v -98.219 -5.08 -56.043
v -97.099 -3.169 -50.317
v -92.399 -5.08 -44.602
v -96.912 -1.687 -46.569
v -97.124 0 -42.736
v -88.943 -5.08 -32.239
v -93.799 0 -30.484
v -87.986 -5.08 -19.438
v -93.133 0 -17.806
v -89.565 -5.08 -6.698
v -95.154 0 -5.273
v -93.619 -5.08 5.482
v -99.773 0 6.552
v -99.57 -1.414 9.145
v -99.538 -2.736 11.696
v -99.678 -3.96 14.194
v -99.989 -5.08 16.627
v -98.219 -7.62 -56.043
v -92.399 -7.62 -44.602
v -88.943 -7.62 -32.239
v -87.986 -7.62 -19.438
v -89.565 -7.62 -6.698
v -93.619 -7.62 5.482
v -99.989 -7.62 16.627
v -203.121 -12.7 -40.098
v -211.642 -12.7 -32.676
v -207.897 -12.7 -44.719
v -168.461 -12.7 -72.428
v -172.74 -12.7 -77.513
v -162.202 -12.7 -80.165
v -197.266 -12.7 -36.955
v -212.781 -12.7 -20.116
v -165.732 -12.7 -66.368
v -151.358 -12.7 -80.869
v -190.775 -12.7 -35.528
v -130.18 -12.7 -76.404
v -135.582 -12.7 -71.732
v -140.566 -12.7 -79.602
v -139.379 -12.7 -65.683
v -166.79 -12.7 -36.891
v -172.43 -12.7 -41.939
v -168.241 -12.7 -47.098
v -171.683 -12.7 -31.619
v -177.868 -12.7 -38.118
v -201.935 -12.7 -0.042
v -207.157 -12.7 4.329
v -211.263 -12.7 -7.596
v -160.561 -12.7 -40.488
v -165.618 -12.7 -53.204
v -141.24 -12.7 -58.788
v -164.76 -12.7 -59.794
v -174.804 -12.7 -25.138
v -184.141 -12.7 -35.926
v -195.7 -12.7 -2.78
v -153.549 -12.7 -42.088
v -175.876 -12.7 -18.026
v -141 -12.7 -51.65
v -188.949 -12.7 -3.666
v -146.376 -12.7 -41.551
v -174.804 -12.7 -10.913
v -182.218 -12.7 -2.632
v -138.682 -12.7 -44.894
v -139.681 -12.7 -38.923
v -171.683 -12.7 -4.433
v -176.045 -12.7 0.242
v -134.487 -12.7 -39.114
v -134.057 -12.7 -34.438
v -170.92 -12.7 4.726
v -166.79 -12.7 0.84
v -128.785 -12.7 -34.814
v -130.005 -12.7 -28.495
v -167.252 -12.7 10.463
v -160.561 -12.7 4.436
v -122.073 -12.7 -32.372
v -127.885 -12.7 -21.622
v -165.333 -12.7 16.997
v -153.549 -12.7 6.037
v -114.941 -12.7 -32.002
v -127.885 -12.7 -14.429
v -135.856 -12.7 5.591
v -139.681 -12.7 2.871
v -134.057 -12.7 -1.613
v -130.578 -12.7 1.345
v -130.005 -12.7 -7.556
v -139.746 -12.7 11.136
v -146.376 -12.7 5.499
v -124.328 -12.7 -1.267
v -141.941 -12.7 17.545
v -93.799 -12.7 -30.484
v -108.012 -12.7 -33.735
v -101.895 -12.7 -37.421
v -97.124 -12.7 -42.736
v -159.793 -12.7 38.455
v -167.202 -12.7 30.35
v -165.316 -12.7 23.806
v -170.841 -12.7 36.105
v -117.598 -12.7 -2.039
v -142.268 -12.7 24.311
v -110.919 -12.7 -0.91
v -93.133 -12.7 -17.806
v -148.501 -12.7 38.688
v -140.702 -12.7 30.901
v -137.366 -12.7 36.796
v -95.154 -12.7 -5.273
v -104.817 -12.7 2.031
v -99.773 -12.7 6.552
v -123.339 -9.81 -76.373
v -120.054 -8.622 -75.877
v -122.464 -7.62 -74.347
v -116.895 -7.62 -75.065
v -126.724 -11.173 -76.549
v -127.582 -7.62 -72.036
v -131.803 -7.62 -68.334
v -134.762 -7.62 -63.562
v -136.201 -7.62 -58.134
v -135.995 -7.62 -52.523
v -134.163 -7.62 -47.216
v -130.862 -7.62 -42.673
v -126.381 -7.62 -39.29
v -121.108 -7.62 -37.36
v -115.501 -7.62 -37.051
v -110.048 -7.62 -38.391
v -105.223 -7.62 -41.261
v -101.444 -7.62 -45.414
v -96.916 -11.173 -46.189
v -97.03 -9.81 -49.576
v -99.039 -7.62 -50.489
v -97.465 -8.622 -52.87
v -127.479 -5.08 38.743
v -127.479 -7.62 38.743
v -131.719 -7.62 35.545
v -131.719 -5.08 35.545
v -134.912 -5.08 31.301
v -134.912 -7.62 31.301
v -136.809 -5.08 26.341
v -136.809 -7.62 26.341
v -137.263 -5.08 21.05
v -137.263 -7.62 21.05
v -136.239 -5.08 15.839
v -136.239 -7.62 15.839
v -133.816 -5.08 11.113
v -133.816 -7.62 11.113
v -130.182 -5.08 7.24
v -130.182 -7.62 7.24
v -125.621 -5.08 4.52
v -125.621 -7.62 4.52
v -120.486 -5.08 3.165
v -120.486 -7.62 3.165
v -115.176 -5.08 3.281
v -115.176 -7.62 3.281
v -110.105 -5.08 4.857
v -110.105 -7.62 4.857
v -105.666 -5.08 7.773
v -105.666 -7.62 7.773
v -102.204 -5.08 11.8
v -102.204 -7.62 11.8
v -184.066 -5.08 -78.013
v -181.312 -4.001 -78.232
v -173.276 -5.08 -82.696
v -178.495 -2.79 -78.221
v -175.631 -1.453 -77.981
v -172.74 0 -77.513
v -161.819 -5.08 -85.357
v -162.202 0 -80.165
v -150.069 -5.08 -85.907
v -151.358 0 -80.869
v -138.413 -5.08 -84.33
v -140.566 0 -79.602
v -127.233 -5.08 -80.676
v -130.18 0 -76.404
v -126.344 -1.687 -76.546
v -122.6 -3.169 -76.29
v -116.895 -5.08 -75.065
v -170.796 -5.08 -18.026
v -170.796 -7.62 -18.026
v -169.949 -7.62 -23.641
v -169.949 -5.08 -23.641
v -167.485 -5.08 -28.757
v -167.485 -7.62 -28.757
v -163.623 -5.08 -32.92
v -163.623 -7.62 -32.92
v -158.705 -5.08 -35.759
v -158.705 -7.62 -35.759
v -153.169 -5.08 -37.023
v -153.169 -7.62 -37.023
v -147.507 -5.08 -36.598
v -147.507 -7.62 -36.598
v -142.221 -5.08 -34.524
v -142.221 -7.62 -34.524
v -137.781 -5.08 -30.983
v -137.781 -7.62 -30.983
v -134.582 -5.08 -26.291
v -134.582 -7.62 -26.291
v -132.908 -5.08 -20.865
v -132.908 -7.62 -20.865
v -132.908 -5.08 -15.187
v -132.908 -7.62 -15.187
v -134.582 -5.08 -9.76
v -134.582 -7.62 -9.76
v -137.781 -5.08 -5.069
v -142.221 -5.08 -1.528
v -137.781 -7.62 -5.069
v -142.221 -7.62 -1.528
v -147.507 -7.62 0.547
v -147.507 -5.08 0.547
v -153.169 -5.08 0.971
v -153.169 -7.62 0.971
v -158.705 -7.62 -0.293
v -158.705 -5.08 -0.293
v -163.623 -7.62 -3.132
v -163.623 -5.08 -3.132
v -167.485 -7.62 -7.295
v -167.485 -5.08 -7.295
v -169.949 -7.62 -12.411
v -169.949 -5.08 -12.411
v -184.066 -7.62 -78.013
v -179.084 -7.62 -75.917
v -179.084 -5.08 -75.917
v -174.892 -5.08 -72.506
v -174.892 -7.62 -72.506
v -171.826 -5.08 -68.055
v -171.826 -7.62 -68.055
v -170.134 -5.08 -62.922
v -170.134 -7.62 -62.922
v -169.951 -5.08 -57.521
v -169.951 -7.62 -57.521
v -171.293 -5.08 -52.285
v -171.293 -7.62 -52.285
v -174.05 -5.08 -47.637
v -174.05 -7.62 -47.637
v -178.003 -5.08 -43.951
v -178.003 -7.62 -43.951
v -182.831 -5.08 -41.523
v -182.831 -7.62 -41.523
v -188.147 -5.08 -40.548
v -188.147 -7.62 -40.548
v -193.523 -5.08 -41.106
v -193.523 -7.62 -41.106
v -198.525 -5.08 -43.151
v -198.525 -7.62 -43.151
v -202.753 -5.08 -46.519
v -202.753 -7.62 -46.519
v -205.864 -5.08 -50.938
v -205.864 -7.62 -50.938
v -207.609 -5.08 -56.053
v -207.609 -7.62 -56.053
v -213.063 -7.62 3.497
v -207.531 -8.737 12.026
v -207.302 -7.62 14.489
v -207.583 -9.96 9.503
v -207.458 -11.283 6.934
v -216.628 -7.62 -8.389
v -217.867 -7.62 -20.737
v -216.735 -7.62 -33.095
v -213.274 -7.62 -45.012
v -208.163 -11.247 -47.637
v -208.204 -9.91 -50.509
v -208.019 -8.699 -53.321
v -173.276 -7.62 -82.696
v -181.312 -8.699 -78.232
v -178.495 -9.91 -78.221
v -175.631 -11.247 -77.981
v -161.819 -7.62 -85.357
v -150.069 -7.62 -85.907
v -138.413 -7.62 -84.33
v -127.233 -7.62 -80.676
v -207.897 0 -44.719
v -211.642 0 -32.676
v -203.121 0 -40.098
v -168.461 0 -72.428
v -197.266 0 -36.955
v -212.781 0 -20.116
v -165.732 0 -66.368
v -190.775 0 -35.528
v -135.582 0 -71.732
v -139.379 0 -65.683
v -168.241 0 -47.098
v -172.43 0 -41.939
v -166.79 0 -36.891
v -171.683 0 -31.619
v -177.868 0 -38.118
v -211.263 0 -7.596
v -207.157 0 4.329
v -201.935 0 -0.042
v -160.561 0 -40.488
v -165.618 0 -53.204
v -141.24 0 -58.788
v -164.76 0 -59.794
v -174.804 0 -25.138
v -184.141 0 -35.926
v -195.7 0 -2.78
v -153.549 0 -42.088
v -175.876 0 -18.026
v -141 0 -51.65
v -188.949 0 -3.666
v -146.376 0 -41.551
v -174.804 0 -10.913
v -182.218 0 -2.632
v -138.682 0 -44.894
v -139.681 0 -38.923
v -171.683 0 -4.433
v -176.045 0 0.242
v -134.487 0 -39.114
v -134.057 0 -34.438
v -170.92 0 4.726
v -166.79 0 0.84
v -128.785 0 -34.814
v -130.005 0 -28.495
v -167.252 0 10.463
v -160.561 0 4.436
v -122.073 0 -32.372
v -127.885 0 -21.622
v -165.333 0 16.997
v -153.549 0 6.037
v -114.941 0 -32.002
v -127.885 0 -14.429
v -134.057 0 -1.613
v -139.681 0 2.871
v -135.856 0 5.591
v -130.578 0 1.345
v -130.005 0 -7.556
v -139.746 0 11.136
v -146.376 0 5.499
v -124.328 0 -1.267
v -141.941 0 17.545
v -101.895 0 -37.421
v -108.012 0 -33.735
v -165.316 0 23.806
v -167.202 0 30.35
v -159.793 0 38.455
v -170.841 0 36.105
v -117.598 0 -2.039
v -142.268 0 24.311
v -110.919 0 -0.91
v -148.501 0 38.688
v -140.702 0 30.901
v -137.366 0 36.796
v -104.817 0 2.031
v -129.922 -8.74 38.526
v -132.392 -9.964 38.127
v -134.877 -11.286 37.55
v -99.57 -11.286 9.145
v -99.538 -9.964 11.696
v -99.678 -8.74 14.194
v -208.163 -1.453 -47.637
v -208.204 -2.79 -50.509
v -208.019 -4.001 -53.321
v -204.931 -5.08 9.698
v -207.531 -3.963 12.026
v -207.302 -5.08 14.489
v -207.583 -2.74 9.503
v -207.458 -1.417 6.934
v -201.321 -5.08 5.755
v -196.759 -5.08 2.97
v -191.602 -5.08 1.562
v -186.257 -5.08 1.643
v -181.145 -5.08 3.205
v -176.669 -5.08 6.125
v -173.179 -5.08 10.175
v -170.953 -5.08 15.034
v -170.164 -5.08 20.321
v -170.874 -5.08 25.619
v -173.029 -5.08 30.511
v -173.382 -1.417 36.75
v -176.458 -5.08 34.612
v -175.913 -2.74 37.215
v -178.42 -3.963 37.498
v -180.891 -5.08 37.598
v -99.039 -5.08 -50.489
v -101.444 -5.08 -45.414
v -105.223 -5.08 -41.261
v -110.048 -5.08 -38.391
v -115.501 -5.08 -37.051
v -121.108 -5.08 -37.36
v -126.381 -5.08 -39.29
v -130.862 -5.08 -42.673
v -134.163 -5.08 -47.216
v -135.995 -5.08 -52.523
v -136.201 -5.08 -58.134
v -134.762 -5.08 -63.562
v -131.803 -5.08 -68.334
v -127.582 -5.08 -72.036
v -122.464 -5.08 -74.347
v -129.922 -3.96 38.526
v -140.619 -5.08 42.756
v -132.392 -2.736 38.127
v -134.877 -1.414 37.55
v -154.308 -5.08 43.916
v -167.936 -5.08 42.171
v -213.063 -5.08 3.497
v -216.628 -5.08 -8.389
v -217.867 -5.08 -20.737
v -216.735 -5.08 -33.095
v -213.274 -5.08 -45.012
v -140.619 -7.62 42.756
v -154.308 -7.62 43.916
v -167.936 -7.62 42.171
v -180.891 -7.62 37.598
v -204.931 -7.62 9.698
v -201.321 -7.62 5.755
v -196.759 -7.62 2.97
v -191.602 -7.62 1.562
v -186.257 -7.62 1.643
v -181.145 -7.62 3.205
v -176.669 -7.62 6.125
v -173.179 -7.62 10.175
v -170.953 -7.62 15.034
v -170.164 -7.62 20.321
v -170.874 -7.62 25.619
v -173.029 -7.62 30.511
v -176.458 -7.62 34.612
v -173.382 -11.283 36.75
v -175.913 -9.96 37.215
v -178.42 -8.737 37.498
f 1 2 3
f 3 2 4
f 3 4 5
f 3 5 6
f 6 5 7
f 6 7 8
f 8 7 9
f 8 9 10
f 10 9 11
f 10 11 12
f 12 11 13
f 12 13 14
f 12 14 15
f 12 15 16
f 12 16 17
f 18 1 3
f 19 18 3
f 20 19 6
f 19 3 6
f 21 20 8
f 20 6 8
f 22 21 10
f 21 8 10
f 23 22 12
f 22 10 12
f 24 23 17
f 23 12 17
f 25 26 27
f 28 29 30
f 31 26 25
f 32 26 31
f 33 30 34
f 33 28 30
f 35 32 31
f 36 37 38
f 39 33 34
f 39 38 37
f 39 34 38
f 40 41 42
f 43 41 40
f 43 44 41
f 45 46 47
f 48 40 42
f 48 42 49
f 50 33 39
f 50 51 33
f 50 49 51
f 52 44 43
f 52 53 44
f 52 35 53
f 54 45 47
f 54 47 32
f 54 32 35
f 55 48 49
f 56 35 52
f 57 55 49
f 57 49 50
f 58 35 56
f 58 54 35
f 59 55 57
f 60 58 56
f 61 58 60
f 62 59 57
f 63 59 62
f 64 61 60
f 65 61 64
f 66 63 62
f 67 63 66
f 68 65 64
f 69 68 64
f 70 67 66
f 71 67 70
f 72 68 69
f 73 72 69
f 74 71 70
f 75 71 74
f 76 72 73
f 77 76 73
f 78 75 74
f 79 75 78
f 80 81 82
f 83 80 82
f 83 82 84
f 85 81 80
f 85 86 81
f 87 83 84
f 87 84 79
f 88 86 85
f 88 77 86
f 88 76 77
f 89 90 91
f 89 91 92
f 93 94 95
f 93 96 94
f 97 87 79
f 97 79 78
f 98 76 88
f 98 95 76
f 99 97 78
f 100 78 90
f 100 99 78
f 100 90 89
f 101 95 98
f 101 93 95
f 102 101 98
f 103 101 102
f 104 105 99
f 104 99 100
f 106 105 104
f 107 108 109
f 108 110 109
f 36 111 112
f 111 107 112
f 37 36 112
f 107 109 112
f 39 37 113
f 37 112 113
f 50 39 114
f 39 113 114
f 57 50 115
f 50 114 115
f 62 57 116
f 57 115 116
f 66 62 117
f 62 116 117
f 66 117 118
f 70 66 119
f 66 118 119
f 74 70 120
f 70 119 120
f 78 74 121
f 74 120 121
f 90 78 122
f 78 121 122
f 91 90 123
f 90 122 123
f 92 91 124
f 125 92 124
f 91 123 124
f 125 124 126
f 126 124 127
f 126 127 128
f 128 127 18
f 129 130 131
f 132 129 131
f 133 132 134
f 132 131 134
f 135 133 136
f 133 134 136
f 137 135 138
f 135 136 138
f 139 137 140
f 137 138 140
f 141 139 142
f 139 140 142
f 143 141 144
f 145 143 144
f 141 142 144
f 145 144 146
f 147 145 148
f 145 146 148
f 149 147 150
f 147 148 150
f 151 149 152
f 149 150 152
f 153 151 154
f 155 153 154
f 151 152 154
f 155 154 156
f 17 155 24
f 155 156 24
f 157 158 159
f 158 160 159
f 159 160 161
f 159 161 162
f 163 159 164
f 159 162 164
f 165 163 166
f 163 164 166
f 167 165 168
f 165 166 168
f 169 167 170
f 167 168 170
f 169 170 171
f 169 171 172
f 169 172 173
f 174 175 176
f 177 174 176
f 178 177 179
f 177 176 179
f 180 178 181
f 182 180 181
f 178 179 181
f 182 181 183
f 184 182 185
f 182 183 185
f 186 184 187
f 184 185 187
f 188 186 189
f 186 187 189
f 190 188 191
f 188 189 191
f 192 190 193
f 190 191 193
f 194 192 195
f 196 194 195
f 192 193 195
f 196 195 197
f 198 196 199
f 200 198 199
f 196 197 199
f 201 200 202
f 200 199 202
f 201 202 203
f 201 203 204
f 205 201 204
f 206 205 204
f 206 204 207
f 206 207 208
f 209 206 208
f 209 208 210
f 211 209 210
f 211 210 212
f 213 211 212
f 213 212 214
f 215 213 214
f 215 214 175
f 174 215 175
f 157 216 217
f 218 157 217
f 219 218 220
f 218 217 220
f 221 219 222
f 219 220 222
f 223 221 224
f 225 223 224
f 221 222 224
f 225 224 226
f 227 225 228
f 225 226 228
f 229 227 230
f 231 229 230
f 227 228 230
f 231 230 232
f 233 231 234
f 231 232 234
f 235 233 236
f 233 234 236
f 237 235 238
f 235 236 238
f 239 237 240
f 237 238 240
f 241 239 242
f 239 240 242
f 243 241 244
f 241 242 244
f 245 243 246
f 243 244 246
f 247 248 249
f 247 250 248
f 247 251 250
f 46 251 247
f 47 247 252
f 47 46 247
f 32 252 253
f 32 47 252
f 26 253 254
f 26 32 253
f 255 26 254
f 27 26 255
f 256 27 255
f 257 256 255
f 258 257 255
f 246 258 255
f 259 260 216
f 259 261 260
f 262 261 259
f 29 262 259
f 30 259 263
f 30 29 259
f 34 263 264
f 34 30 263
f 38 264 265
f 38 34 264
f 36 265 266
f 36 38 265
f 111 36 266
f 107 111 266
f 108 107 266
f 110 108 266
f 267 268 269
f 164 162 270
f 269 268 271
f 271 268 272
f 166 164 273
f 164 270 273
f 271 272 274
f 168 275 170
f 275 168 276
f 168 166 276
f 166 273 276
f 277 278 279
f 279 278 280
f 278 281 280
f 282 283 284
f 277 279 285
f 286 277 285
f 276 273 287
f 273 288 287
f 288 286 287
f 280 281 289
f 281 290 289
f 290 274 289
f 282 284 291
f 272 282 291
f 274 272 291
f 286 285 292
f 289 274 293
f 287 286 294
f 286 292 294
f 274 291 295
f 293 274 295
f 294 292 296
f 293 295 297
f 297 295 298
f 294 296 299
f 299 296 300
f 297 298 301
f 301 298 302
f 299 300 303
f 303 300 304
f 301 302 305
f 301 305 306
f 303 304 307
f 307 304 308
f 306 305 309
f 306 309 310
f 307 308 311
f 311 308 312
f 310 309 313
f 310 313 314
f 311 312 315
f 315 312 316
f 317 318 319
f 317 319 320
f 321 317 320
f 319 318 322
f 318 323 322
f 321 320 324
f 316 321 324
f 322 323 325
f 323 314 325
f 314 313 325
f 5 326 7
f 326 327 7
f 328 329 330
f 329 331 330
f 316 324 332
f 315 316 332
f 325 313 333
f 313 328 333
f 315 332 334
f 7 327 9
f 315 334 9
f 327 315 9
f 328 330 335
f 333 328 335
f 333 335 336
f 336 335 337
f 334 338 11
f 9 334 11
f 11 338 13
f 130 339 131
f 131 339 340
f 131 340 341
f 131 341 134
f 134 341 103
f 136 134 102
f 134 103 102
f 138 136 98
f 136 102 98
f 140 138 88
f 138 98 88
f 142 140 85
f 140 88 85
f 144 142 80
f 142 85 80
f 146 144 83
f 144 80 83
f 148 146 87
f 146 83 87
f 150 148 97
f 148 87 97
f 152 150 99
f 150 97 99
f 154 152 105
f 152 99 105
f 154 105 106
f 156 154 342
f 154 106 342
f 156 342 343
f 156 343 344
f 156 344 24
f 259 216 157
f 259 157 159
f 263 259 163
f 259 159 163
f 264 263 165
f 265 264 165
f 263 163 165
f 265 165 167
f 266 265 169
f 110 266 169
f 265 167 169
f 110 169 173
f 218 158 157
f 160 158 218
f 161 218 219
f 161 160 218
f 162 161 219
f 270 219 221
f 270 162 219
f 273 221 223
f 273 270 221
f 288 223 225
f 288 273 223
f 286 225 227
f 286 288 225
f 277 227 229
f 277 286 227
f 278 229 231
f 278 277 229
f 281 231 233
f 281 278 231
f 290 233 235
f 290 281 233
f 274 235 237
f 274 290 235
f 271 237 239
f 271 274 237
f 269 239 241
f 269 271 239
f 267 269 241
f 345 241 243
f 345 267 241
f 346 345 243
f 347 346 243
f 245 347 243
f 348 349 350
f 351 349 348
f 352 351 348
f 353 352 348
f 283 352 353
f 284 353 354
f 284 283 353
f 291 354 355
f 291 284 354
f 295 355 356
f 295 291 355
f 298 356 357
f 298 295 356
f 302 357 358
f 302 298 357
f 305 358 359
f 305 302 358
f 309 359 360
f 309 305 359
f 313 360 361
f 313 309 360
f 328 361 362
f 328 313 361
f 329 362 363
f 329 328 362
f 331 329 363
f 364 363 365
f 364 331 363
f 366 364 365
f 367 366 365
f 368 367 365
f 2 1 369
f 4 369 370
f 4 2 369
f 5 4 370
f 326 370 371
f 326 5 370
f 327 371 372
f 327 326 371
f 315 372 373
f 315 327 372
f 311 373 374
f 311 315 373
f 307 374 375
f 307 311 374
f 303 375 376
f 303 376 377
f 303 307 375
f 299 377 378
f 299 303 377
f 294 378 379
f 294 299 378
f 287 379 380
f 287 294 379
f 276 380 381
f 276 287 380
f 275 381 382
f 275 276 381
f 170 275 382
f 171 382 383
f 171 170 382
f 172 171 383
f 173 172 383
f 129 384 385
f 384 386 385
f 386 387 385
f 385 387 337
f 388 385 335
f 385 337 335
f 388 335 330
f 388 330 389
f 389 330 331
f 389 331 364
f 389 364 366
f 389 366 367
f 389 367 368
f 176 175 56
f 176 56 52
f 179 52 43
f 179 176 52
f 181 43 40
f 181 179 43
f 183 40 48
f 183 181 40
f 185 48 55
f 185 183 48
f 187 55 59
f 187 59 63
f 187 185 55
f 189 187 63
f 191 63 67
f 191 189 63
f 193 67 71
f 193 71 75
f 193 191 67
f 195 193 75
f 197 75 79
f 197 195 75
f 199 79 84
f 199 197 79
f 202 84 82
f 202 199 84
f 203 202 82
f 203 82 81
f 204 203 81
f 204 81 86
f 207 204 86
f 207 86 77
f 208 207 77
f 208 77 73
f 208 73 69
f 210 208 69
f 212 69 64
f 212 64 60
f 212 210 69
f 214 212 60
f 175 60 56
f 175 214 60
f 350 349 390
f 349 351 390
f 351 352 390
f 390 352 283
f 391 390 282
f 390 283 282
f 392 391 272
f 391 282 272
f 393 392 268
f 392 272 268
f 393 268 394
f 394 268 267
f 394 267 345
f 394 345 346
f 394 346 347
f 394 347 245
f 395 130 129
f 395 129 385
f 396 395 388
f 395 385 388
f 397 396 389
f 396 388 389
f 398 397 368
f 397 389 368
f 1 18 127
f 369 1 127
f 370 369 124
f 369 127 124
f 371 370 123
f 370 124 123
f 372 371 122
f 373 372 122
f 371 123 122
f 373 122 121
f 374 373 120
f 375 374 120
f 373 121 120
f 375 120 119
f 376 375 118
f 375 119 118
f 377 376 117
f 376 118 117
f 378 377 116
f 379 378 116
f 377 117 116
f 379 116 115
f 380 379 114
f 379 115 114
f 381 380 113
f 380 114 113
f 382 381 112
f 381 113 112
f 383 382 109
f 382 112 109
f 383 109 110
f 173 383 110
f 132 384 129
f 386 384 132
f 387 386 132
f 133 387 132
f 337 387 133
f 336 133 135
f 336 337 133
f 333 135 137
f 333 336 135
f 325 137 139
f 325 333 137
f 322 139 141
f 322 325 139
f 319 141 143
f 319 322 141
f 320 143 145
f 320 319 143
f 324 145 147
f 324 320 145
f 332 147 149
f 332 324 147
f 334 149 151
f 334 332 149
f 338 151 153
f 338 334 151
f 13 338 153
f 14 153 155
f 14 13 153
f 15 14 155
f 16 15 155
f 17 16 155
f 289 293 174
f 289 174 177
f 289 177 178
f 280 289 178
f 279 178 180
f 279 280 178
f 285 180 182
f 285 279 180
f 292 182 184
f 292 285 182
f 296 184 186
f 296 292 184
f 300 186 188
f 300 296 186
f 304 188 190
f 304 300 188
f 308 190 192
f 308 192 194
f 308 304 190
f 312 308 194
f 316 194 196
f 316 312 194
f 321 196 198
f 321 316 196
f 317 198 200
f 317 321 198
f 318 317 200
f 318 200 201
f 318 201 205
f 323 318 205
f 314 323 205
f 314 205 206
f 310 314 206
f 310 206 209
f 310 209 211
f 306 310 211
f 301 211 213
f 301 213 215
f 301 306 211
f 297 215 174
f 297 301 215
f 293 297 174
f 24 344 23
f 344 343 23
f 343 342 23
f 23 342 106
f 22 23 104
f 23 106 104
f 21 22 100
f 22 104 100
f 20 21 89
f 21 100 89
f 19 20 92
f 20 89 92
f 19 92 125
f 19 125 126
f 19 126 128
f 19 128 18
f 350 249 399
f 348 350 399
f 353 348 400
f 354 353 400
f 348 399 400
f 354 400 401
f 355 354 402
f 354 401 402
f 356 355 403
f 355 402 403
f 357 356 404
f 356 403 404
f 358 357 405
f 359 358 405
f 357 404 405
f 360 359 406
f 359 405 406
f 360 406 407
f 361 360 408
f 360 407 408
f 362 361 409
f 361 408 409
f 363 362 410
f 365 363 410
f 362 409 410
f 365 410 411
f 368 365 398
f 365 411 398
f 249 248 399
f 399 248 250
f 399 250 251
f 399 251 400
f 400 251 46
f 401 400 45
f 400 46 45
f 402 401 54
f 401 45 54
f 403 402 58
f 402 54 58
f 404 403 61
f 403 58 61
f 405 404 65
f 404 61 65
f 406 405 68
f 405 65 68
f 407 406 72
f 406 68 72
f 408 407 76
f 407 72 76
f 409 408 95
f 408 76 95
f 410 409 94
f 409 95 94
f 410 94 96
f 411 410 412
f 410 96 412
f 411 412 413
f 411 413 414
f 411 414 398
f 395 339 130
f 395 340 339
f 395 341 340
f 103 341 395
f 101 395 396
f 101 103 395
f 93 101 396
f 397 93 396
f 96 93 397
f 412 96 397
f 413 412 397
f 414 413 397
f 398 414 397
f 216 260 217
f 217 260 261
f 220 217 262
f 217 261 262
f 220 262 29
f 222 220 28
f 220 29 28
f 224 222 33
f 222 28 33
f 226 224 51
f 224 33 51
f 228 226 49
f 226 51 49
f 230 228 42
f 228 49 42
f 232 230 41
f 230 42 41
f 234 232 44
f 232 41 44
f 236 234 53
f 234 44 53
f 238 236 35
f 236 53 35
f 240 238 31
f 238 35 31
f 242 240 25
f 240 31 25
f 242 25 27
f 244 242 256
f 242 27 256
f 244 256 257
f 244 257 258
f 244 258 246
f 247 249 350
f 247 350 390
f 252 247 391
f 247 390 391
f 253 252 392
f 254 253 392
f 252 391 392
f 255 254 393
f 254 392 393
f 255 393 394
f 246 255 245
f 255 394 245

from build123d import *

# Parameters (mm, degrees)
F0_R     = 64.9505041371
F1_DEPTH = 12.7
F3_D     = 38.1
F4_SIZE  = 5.08


with BuildPart() as f1:
    # F0 (on Front) → F1 (new body)
    with BuildSketch(Plane.XZ):
        with Locations((-152.9169678688, -21.0192166269)):
            Circle(F0_R)
    extrude(amount=F1_DEPTH)

    # F3 (through all)
    with Locations(Plane(origin=(0, 0, 0), x_dir=(1, 0, 0), z_dir=(0, 1, 0))):
        with Locations((-151.7456322908, 18.0257931352), (-118.2411909103, -22.082446143), (-189.2130970955, -20.4620826989), (-188.8890266418, 59.5838613808), (-117.2689720988, 56.019064039)):
            Hole(F3_D / 2)

    # F4
    f4_edges = [f1.edges().sort_by_distance(p)[0] for p in [
        (-130.862366, -12.7, -42.672824),
        (-87.985724, -12.7, -19.437569),
        (-130.182417, -12.7, 7.239615),
        (-154.308279, -12.7, 43.916384),
        (-176.668586, -12.7, 6.125495),
        (-217.866858, -12.7, -20.736903),
        (-175.895036, -12.7, -45.653365),
        (-150.069359, -12.7, -85.907267),
        (-170.795632, -12.7, -18.025793),
        (-87.985724, 0, -19.437569),
        (-130.182417, 0, 7.239615),
        (-154.308279, 0, 43.916384),
        (-176.668586, 0, 6.125495),
        (-217.866858, 0, -20.736903),
        (-175.895036, 0, -45.653365),
        (-150.069359, 0, -85.907267),
        (-130.862366, 0, -42.672824),
        (-170.795632, 0, -18.025793),
    ]]
    chamfer(f4_edges, length=F4_SIZE)


solid = f1.part
